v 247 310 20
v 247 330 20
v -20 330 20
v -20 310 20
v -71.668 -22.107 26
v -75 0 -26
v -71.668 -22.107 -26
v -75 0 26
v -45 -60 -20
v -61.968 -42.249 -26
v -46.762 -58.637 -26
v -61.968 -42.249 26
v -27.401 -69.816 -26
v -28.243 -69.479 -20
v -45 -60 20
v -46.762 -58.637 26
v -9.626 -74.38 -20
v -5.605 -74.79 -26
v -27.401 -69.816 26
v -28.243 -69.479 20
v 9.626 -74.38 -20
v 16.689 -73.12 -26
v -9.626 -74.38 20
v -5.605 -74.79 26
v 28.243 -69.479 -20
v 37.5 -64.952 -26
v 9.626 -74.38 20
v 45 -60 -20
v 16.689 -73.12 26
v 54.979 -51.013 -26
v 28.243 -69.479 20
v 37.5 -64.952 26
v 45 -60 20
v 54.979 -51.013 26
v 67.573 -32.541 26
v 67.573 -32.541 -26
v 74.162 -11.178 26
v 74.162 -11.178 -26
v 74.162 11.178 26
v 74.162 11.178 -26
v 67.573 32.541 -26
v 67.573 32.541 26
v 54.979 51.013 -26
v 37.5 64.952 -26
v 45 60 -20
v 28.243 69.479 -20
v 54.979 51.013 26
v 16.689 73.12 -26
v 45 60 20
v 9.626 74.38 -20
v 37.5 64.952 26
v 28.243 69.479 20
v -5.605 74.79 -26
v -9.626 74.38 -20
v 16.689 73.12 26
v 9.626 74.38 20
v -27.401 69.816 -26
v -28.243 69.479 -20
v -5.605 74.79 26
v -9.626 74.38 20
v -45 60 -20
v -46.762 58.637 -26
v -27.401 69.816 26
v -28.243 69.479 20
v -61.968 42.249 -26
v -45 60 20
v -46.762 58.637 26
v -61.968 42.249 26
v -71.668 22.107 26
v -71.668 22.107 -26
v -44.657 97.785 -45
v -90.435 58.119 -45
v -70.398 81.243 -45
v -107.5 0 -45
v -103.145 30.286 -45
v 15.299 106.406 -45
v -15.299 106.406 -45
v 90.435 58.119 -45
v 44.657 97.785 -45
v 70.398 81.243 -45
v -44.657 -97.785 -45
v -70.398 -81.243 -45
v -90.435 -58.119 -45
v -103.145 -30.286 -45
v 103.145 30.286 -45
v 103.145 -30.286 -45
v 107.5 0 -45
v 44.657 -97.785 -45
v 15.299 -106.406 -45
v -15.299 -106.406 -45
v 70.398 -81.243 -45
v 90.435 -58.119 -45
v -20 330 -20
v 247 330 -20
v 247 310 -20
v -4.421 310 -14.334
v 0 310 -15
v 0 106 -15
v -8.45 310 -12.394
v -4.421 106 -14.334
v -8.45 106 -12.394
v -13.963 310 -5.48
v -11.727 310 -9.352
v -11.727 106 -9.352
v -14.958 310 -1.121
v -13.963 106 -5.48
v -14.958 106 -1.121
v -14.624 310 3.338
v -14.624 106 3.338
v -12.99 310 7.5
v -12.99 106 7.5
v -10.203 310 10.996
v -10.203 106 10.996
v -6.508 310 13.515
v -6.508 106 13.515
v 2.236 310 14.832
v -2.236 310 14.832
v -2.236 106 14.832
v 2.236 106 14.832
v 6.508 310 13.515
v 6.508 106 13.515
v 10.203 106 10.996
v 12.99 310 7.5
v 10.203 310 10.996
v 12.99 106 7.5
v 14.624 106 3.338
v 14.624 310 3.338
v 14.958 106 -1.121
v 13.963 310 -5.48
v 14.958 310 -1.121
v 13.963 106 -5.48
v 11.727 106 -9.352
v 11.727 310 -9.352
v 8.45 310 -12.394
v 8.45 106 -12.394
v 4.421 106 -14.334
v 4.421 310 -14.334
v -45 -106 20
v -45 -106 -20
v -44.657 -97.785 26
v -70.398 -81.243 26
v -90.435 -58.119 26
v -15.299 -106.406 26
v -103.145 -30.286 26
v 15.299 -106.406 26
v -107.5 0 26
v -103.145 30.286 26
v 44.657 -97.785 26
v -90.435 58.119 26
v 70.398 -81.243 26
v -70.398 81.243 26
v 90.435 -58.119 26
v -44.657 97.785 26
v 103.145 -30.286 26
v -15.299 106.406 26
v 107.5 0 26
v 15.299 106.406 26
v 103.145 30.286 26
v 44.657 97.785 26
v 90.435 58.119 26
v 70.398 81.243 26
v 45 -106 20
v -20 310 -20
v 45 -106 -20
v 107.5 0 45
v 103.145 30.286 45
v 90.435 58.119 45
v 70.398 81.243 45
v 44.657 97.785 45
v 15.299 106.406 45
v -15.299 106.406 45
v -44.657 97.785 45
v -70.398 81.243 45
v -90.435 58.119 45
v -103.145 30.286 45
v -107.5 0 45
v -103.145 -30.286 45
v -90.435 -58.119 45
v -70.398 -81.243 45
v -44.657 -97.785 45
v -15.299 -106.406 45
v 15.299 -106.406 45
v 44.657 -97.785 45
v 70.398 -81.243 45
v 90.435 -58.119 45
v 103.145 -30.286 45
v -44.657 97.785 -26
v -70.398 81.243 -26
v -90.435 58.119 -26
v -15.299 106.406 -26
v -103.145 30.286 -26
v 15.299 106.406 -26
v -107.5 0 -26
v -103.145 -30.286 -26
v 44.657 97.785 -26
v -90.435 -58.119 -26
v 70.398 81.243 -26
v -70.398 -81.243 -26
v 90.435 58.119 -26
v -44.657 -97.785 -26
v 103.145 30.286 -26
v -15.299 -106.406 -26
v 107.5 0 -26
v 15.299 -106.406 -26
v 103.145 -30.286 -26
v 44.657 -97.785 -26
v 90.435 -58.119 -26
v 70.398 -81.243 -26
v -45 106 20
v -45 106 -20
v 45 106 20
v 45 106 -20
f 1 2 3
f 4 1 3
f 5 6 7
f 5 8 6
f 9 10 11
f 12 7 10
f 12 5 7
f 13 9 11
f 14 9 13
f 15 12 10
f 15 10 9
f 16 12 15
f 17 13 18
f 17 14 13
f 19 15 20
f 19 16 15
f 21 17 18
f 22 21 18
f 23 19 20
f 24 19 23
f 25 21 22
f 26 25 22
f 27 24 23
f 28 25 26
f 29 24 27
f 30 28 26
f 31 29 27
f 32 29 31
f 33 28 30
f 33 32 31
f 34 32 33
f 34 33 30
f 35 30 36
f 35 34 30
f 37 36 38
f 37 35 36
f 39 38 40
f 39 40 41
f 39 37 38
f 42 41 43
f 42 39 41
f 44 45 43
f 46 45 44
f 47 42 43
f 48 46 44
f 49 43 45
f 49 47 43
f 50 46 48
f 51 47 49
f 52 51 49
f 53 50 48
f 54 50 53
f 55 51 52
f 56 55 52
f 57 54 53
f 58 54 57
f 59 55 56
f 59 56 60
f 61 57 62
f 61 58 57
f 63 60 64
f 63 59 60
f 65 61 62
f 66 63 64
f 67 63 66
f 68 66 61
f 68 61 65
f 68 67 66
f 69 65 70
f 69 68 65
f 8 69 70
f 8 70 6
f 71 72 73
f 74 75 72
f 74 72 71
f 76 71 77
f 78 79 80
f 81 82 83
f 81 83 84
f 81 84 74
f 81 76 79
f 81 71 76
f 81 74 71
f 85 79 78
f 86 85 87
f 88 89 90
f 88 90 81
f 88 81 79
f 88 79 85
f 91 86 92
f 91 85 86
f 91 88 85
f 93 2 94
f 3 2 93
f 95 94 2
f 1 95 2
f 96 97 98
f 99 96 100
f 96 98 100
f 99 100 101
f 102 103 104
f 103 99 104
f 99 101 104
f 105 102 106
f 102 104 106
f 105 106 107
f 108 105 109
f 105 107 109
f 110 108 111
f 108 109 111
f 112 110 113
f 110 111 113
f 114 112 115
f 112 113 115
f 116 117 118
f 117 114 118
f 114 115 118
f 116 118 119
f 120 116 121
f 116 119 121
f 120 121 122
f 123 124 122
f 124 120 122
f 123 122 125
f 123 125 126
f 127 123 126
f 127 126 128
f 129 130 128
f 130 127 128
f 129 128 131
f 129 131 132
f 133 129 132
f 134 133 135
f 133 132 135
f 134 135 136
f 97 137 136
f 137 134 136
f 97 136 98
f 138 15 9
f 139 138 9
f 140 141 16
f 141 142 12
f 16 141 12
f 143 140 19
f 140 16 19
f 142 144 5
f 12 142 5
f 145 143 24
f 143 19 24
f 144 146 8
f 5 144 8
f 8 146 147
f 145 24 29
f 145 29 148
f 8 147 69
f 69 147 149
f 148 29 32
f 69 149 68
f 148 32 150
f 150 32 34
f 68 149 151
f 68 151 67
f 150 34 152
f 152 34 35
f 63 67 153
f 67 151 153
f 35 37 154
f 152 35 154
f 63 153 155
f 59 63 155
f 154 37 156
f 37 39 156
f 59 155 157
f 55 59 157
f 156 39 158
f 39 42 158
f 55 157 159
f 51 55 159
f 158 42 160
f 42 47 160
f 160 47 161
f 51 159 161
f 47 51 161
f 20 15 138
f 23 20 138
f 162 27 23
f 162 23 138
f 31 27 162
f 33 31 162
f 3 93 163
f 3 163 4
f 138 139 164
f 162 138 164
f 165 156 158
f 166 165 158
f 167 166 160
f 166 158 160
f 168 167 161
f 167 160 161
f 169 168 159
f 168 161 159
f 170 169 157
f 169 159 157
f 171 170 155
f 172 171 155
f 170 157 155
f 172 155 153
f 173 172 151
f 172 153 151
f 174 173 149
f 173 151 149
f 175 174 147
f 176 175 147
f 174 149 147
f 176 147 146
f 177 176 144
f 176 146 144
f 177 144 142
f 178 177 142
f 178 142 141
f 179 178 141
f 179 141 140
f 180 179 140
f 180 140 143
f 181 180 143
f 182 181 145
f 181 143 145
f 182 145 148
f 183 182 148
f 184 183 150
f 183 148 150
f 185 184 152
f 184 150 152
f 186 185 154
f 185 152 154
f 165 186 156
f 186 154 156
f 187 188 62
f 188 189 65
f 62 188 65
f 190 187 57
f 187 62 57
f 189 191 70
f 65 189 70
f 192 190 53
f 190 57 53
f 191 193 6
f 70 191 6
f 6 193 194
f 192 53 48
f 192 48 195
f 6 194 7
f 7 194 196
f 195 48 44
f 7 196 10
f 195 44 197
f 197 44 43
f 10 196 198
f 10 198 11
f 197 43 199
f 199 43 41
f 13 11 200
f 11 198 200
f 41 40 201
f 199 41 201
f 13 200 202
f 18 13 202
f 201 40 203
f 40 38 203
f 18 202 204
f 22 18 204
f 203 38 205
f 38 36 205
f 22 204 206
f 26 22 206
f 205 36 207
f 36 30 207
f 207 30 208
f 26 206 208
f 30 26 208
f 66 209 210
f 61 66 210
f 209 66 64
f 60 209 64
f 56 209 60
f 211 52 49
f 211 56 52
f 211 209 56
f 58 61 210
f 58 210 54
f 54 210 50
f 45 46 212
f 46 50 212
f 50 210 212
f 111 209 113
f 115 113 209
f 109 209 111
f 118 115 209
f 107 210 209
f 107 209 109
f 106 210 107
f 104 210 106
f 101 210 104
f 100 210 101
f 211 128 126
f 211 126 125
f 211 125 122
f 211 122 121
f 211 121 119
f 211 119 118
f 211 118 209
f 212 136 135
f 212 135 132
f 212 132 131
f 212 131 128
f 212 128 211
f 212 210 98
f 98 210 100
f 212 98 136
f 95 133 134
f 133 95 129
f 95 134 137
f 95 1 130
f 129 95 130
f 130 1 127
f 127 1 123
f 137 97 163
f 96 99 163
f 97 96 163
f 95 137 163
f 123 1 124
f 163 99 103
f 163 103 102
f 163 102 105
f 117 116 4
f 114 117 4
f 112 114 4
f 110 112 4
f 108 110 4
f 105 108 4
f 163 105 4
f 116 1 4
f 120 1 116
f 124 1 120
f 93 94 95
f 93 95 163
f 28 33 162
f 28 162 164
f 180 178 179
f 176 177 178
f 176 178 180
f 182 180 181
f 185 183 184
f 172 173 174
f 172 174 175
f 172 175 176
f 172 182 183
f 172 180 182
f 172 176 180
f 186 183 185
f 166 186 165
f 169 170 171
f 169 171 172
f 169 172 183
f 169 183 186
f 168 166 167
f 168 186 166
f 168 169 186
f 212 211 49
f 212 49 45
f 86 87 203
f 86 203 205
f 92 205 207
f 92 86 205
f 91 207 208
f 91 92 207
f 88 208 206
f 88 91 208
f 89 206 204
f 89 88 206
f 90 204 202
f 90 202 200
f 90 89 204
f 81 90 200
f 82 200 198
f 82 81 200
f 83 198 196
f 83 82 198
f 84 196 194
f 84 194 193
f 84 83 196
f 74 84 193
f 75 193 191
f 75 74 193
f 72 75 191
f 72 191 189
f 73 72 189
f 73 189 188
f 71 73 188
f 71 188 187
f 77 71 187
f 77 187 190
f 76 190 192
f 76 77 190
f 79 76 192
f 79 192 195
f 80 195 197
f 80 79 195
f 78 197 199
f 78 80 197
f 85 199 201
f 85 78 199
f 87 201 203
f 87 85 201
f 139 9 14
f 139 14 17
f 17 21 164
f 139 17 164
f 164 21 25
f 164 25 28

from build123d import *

# Parameters (mm, degrees)
SKETCH_1_R        = 75
EXTRUDE_296_DEPTH = 26
SKETCH_2_R        = 15
EXTRUDE_341_DEPTH = 330
SKETCH_3_W        = 267
SKETCH_3_H        = 40
EXTRUDE_488_DEPTH = 20
SKETCH_4_W        = 90
SKETCH_4_H        = 40
EXTRUDE_594_DEPTH = 106
SKETCH_5_R        = 107.5
EXTRUDE_1_DEPTH   = 19
EXTRUDE_START     = 19
SKETCH_6_R        = 107.5
EXTRUDE_2_DEPTH   = 19


with BuildPart() as part:
    # Эскиз1 → Extrude 296 (new, symmetric)
    with BuildSketch(Plane.XY):
        Circle(SKETCH_1_R)
    extrude(amount=EXTRUDE_296_DEPTH, both=True)

    # Эскиз2 → Extrude 341 (add)
    with BuildSketch(Plane(origin=(0, 0, 0), x_dir=(1, 0, 0), z_dir=(0, 1, 0))):
        Circle(SKETCH_2_R)
    extrude(amount=EXTRUDE_341_DEPTH)

    # Эскиз3 → Extrude 488 (add)
    with BuildSketch(Plane(origin=(0, 330, 0), x_dir=(-1, 0, 0), z_dir=(0, 1, 0))):
        with Locations((-113.5, 0)):
            Rectangle(SKETCH_3_W, SKETCH_3_H)
    extrude(amount=-EXTRUDE_488_DEPTH)

    # Эскиз4 → Extrude 594 (add, symmetric)
    with BuildSketch(Plane(origin=(0, 0, 0), x_dir=(1, 0, 0), z_dir=(0, 1, 0))):
        Rectangle(SKETCH_4_W, SKETCH_4_H)
    extrude(amount=EXTRUDE_594_DEPTH, both=True)

    # Эскиз5 → Фланец1 (add)
    with BuildSketch(Plane.XY.offset(26)):
        Circle(SKETCH_5_R)
    extrude(amount=EXTRUDE_1_DEPTH)

    # Эскиз6 → Фланец2 (add)
    with BuildSketch(Plane(origin=(0, 0, -26), x_dir=(-1, 0, 0), z_dir=(0, 0, -1)).offset(EXTRUDE_START)):
        Circle(SKETCH_6_R)
    extrude(amount=-EXTRUDE_2_DEPTH)


solid = part.part
